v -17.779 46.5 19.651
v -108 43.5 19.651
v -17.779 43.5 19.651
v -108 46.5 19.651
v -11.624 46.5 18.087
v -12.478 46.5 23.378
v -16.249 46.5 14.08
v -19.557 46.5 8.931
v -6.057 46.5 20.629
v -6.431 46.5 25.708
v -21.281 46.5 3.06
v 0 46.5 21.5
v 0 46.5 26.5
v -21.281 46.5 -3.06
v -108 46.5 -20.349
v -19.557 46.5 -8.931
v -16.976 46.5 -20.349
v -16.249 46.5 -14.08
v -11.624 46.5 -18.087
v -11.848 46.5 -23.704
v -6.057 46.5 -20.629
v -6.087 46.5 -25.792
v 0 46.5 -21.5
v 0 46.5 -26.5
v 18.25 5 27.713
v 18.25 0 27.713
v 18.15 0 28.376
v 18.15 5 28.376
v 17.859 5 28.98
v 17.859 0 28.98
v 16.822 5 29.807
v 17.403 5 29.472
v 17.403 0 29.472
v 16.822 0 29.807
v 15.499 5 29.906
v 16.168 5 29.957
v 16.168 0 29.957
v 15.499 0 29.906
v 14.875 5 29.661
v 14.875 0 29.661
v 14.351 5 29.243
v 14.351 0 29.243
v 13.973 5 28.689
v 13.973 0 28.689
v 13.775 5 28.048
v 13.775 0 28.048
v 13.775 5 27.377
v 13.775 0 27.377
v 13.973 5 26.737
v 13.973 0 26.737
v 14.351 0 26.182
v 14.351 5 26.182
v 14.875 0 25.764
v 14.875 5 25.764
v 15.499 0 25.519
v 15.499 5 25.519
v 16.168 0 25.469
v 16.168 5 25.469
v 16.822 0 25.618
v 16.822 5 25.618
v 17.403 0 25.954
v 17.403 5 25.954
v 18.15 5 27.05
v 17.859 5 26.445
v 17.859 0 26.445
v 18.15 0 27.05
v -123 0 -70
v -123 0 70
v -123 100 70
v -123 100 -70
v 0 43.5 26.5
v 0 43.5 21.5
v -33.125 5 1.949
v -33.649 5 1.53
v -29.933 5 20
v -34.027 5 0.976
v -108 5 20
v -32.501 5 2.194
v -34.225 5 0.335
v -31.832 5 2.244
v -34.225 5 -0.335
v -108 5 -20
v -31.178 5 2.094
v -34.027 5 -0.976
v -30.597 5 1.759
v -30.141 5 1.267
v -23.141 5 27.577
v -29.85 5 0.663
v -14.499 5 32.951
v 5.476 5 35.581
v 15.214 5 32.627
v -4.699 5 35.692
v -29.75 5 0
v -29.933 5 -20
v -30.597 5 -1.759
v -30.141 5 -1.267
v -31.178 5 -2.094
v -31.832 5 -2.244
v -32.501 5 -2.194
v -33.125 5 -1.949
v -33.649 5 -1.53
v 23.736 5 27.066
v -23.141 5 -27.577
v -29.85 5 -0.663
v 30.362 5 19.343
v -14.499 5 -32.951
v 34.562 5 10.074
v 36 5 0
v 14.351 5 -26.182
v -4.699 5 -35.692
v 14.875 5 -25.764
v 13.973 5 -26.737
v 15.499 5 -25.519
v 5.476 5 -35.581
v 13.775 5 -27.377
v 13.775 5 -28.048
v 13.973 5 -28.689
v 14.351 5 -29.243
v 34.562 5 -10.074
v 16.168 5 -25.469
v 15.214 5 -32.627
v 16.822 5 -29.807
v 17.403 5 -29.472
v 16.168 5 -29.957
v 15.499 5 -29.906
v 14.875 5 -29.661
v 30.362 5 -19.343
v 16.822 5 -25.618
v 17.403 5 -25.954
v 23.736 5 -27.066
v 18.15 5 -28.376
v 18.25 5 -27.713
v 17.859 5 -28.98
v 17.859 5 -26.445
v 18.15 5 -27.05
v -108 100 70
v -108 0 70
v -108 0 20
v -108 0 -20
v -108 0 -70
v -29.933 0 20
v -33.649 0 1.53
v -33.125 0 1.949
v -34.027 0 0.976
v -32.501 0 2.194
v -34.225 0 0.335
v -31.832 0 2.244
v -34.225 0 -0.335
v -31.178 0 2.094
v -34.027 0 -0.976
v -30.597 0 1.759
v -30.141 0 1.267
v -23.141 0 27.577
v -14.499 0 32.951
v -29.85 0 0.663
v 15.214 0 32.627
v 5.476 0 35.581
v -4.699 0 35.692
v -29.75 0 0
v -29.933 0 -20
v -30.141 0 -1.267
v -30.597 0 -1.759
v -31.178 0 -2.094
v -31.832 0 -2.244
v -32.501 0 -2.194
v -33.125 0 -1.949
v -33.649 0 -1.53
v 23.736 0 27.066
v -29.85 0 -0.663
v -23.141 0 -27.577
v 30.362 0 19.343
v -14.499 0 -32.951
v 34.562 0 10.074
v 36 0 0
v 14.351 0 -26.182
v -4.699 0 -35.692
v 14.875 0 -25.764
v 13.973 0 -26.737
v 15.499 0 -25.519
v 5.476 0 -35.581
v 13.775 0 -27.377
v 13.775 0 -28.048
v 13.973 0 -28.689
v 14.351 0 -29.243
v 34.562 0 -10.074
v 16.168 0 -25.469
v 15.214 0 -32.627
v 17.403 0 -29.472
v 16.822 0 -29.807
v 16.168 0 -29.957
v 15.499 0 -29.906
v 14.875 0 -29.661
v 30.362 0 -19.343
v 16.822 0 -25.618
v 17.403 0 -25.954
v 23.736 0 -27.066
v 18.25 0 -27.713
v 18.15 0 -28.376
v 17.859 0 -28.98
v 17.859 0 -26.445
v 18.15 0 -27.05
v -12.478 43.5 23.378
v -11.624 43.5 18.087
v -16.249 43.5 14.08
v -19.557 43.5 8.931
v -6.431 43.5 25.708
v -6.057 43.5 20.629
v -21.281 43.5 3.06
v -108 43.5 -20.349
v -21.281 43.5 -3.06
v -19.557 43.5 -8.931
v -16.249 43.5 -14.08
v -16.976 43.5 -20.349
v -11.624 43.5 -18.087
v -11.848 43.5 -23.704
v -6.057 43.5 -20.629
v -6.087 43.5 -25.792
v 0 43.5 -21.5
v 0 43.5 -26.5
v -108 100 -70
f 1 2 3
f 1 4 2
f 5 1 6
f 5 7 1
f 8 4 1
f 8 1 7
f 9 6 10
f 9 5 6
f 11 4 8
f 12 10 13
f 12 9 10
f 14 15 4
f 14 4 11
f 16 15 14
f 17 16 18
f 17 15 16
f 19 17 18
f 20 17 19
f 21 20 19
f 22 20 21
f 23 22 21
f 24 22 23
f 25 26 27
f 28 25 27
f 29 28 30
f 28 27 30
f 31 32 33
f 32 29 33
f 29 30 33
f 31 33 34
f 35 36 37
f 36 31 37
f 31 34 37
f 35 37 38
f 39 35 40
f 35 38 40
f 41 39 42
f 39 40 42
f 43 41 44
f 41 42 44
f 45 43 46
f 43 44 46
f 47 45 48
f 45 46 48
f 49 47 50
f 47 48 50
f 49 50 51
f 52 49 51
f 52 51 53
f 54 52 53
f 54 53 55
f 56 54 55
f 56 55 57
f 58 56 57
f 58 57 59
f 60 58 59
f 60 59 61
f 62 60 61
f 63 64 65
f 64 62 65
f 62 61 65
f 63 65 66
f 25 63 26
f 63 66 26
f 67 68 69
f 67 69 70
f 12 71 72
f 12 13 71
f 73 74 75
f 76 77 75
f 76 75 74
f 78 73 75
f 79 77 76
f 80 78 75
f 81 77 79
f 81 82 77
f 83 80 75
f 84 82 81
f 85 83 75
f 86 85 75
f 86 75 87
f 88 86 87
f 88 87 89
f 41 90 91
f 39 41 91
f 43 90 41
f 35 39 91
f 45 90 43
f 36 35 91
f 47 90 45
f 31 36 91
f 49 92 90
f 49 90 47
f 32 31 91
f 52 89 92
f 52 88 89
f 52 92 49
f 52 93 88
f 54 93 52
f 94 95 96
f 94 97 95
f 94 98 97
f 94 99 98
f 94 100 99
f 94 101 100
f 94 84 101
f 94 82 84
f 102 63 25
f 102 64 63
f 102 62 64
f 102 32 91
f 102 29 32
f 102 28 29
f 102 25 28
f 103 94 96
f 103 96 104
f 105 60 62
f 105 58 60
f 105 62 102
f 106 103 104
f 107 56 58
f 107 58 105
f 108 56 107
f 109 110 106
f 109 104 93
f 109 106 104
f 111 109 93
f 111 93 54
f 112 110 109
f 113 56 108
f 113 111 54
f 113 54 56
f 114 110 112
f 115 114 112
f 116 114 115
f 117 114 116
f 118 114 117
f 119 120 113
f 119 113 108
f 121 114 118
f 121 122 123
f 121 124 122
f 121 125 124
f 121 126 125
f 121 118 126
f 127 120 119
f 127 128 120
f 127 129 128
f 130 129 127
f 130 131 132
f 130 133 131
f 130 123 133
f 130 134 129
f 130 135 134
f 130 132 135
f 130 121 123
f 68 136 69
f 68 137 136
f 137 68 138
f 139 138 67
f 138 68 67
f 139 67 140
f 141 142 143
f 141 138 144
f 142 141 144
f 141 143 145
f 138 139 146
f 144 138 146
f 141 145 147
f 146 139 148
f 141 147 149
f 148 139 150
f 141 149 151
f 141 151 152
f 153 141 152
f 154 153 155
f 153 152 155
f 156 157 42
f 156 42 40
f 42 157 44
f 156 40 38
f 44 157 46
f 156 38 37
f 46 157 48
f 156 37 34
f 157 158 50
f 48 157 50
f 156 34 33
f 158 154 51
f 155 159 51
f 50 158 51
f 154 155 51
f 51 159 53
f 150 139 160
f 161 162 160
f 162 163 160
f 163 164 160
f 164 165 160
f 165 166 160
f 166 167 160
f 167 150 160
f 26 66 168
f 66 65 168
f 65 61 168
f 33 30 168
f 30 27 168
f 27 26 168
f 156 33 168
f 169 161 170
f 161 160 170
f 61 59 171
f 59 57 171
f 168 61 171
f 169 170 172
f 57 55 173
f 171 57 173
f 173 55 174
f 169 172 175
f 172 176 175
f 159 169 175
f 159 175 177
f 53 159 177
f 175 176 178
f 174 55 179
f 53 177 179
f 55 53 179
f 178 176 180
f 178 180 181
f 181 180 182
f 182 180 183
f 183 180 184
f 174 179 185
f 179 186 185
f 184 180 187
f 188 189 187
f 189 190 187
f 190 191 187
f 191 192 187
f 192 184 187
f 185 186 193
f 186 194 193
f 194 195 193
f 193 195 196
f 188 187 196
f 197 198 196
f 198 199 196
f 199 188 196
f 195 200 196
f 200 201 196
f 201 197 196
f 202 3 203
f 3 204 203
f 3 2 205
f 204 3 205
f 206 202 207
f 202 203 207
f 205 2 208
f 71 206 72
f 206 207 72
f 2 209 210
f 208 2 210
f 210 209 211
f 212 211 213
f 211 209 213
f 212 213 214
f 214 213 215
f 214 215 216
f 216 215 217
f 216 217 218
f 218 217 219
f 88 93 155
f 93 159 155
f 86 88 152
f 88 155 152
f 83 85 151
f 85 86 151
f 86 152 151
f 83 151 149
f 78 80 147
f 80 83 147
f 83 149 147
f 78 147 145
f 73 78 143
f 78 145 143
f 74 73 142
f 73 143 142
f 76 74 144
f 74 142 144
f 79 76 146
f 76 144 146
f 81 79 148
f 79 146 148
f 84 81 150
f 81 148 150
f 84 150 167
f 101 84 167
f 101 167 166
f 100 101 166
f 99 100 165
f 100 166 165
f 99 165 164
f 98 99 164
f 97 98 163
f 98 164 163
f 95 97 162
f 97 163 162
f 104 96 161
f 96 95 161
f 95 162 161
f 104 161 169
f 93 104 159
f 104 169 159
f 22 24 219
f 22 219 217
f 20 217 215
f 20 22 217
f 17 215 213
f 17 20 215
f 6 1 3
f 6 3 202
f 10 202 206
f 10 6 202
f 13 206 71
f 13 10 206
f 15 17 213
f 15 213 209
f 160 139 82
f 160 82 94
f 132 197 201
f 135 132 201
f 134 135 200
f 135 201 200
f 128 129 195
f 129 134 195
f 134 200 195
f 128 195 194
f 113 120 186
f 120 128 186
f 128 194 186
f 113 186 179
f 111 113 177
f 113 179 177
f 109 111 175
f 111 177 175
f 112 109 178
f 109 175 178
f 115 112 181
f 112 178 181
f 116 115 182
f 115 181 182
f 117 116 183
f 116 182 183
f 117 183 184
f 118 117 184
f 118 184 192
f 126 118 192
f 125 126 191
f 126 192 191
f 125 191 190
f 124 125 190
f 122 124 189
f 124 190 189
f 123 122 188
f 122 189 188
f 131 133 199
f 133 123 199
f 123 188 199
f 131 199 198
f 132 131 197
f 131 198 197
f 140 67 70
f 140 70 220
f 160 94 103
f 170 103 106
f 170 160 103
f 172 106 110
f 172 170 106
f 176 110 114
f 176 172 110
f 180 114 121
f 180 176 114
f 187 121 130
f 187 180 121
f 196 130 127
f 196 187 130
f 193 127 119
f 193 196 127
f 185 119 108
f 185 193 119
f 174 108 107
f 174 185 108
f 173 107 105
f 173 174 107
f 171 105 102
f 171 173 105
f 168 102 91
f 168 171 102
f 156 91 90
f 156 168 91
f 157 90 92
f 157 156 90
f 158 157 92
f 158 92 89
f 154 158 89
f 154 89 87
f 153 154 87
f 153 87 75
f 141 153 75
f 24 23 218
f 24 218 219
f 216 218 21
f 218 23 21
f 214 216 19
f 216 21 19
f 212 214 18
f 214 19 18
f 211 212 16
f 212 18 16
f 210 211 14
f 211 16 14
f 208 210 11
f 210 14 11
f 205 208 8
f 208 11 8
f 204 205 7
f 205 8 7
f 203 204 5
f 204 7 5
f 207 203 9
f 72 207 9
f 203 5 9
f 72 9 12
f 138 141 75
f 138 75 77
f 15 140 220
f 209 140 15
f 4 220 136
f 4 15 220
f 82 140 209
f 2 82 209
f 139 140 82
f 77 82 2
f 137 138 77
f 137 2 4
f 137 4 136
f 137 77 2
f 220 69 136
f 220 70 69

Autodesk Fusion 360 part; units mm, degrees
sketch "스케치1" plane through (0, 0, 0) normal (0, 1, 0) x (1, 0, 0)
  circle A0 centre (0, 0) radius 36
  line L0 (-32.5898, 56.4472) -> (34.7247, -60.145) construction
  line L1 (0, 75) -> (0, -75) construction
  line L2 (51.4685, 0) -> (-45, 0) construction
  line L3 (30.2625, 52.4162) -> (-30.7015, -53.1766) construction
  circle A1 centre (0, 0) radius 32 construction
  circle A2 centre (16, -27.7128) radius 2.25
  circle A3 centre (16, 27.7128) radius 2.25
  circle A4 centre (-32, 0) radius 2.25
  curve L4 construction
  point P0 (16, -27.7128)
  point P1 (16, 27.7128)
  point P2 (-32, 0)
  dimension "d2" = 72
  dimension "d3" = 30
  dimension "d4" = 30
  dimension "d5" = 64
  dimension "d6" = 4.5
  dimension "d29" = 100
extrude "돌출1" add sketch "스케치1" along normal blind 2
extrude "돌출2" add 1 faces at (0, 2, 0) along direction (0, 1, 0) blind 3
sketch "스케치2" plane through (0, 0, 0) normal (0, 1, 0) x (1, 0, 0)
  line L0 (20, -20) -> (-108, -20)
  line L1 (-108, -20) -> (-108, 20)
  line L2 (-108, 20) -> (20, 20)
  line L3 (20, 20) -> (20, -20)
  line L4 (0, 75) -> (0, -75)
  circle A0 centre (0, 0) radius 36
  line L5 (-108, -70) -> (-123, -70)
  line L6 (-123, -70) -> (-123, 70)
  line L7 (-123, 70) -> (-108, 70)
  line L8 (-108, 70) -> (-108, -70)
  dimension "d13" = 40
  dimension "d15" = 20
  dimension "d16" = 108
  dimension "d17" = 50
  dimension "d18" = 50
  dimension "d19" = 15
extrude "돌출3" add sketch "스케치2" along normal blind 5 contours L0 L1 L2 A0 L8 | L1 L5 L6 L7 L8
extrude "돌출4" add sketch "스케치2" along normal blind 10 contours L1 L5 L6 L7 L8
extrude "돌출5" add 1 faces at (-113, 10, 23.3333) along direction (0, 1, 0) blind 15
extrude "돌출6" add 1 faces at (-113, 25, 23.3333) along direction (0, 1, 0) blind 75
ref_plane "작업 평면1" through (-43.5, 45, 0) normal (0, 1, 0) x (1, 0, 0)
sketch "스케치3" plane through (-36, 45, 0) normal (0, 1, 0) x (1, 0, 0)
  arc A0 (36, 21.5) -> (36, -21.5) centre (36, 0) ccw
  curve L0
  arc A1 (36, 26.5) -> (36, -26.5) centre (36, 0) ccw
  line L1 (36, 21.5) -> (36, 26.5)
  line L2 (36, -26.5) -> (36, -21.5)
  dimension "d30" = 21.5
  dimension "d31" = 5
sketch "스케치5" plane through (-36, 45, 0) normal (0, 1, 0) x (1, 0, 0)
  line L0 (19.0243, 20.3488) -> (-72.2102, 20.3488)
  line L1 (-72.2102, 20.3488) -> (-72.2102, -19.6512)
  line L2 (-72.2102, -19.6512) -> (19.0243, -19.6512)
  arc A0 (36, 26.5) -> (36, -26.5) centre (36, 0) ccw
  curve L3
extrude "돌출7" add sketch "스케치3" sketch "스케치5" along normal blind 1.5 of sketch 2
extrude "돌출8" add 1 faces at (-79.1466, 45, -0.7681) along direction (0, -1, 0) blind 1.5
equation "d16 = 72 mm + 36 mm"
equation "d30 = ( 43 / 2 ) * 1 mm"
